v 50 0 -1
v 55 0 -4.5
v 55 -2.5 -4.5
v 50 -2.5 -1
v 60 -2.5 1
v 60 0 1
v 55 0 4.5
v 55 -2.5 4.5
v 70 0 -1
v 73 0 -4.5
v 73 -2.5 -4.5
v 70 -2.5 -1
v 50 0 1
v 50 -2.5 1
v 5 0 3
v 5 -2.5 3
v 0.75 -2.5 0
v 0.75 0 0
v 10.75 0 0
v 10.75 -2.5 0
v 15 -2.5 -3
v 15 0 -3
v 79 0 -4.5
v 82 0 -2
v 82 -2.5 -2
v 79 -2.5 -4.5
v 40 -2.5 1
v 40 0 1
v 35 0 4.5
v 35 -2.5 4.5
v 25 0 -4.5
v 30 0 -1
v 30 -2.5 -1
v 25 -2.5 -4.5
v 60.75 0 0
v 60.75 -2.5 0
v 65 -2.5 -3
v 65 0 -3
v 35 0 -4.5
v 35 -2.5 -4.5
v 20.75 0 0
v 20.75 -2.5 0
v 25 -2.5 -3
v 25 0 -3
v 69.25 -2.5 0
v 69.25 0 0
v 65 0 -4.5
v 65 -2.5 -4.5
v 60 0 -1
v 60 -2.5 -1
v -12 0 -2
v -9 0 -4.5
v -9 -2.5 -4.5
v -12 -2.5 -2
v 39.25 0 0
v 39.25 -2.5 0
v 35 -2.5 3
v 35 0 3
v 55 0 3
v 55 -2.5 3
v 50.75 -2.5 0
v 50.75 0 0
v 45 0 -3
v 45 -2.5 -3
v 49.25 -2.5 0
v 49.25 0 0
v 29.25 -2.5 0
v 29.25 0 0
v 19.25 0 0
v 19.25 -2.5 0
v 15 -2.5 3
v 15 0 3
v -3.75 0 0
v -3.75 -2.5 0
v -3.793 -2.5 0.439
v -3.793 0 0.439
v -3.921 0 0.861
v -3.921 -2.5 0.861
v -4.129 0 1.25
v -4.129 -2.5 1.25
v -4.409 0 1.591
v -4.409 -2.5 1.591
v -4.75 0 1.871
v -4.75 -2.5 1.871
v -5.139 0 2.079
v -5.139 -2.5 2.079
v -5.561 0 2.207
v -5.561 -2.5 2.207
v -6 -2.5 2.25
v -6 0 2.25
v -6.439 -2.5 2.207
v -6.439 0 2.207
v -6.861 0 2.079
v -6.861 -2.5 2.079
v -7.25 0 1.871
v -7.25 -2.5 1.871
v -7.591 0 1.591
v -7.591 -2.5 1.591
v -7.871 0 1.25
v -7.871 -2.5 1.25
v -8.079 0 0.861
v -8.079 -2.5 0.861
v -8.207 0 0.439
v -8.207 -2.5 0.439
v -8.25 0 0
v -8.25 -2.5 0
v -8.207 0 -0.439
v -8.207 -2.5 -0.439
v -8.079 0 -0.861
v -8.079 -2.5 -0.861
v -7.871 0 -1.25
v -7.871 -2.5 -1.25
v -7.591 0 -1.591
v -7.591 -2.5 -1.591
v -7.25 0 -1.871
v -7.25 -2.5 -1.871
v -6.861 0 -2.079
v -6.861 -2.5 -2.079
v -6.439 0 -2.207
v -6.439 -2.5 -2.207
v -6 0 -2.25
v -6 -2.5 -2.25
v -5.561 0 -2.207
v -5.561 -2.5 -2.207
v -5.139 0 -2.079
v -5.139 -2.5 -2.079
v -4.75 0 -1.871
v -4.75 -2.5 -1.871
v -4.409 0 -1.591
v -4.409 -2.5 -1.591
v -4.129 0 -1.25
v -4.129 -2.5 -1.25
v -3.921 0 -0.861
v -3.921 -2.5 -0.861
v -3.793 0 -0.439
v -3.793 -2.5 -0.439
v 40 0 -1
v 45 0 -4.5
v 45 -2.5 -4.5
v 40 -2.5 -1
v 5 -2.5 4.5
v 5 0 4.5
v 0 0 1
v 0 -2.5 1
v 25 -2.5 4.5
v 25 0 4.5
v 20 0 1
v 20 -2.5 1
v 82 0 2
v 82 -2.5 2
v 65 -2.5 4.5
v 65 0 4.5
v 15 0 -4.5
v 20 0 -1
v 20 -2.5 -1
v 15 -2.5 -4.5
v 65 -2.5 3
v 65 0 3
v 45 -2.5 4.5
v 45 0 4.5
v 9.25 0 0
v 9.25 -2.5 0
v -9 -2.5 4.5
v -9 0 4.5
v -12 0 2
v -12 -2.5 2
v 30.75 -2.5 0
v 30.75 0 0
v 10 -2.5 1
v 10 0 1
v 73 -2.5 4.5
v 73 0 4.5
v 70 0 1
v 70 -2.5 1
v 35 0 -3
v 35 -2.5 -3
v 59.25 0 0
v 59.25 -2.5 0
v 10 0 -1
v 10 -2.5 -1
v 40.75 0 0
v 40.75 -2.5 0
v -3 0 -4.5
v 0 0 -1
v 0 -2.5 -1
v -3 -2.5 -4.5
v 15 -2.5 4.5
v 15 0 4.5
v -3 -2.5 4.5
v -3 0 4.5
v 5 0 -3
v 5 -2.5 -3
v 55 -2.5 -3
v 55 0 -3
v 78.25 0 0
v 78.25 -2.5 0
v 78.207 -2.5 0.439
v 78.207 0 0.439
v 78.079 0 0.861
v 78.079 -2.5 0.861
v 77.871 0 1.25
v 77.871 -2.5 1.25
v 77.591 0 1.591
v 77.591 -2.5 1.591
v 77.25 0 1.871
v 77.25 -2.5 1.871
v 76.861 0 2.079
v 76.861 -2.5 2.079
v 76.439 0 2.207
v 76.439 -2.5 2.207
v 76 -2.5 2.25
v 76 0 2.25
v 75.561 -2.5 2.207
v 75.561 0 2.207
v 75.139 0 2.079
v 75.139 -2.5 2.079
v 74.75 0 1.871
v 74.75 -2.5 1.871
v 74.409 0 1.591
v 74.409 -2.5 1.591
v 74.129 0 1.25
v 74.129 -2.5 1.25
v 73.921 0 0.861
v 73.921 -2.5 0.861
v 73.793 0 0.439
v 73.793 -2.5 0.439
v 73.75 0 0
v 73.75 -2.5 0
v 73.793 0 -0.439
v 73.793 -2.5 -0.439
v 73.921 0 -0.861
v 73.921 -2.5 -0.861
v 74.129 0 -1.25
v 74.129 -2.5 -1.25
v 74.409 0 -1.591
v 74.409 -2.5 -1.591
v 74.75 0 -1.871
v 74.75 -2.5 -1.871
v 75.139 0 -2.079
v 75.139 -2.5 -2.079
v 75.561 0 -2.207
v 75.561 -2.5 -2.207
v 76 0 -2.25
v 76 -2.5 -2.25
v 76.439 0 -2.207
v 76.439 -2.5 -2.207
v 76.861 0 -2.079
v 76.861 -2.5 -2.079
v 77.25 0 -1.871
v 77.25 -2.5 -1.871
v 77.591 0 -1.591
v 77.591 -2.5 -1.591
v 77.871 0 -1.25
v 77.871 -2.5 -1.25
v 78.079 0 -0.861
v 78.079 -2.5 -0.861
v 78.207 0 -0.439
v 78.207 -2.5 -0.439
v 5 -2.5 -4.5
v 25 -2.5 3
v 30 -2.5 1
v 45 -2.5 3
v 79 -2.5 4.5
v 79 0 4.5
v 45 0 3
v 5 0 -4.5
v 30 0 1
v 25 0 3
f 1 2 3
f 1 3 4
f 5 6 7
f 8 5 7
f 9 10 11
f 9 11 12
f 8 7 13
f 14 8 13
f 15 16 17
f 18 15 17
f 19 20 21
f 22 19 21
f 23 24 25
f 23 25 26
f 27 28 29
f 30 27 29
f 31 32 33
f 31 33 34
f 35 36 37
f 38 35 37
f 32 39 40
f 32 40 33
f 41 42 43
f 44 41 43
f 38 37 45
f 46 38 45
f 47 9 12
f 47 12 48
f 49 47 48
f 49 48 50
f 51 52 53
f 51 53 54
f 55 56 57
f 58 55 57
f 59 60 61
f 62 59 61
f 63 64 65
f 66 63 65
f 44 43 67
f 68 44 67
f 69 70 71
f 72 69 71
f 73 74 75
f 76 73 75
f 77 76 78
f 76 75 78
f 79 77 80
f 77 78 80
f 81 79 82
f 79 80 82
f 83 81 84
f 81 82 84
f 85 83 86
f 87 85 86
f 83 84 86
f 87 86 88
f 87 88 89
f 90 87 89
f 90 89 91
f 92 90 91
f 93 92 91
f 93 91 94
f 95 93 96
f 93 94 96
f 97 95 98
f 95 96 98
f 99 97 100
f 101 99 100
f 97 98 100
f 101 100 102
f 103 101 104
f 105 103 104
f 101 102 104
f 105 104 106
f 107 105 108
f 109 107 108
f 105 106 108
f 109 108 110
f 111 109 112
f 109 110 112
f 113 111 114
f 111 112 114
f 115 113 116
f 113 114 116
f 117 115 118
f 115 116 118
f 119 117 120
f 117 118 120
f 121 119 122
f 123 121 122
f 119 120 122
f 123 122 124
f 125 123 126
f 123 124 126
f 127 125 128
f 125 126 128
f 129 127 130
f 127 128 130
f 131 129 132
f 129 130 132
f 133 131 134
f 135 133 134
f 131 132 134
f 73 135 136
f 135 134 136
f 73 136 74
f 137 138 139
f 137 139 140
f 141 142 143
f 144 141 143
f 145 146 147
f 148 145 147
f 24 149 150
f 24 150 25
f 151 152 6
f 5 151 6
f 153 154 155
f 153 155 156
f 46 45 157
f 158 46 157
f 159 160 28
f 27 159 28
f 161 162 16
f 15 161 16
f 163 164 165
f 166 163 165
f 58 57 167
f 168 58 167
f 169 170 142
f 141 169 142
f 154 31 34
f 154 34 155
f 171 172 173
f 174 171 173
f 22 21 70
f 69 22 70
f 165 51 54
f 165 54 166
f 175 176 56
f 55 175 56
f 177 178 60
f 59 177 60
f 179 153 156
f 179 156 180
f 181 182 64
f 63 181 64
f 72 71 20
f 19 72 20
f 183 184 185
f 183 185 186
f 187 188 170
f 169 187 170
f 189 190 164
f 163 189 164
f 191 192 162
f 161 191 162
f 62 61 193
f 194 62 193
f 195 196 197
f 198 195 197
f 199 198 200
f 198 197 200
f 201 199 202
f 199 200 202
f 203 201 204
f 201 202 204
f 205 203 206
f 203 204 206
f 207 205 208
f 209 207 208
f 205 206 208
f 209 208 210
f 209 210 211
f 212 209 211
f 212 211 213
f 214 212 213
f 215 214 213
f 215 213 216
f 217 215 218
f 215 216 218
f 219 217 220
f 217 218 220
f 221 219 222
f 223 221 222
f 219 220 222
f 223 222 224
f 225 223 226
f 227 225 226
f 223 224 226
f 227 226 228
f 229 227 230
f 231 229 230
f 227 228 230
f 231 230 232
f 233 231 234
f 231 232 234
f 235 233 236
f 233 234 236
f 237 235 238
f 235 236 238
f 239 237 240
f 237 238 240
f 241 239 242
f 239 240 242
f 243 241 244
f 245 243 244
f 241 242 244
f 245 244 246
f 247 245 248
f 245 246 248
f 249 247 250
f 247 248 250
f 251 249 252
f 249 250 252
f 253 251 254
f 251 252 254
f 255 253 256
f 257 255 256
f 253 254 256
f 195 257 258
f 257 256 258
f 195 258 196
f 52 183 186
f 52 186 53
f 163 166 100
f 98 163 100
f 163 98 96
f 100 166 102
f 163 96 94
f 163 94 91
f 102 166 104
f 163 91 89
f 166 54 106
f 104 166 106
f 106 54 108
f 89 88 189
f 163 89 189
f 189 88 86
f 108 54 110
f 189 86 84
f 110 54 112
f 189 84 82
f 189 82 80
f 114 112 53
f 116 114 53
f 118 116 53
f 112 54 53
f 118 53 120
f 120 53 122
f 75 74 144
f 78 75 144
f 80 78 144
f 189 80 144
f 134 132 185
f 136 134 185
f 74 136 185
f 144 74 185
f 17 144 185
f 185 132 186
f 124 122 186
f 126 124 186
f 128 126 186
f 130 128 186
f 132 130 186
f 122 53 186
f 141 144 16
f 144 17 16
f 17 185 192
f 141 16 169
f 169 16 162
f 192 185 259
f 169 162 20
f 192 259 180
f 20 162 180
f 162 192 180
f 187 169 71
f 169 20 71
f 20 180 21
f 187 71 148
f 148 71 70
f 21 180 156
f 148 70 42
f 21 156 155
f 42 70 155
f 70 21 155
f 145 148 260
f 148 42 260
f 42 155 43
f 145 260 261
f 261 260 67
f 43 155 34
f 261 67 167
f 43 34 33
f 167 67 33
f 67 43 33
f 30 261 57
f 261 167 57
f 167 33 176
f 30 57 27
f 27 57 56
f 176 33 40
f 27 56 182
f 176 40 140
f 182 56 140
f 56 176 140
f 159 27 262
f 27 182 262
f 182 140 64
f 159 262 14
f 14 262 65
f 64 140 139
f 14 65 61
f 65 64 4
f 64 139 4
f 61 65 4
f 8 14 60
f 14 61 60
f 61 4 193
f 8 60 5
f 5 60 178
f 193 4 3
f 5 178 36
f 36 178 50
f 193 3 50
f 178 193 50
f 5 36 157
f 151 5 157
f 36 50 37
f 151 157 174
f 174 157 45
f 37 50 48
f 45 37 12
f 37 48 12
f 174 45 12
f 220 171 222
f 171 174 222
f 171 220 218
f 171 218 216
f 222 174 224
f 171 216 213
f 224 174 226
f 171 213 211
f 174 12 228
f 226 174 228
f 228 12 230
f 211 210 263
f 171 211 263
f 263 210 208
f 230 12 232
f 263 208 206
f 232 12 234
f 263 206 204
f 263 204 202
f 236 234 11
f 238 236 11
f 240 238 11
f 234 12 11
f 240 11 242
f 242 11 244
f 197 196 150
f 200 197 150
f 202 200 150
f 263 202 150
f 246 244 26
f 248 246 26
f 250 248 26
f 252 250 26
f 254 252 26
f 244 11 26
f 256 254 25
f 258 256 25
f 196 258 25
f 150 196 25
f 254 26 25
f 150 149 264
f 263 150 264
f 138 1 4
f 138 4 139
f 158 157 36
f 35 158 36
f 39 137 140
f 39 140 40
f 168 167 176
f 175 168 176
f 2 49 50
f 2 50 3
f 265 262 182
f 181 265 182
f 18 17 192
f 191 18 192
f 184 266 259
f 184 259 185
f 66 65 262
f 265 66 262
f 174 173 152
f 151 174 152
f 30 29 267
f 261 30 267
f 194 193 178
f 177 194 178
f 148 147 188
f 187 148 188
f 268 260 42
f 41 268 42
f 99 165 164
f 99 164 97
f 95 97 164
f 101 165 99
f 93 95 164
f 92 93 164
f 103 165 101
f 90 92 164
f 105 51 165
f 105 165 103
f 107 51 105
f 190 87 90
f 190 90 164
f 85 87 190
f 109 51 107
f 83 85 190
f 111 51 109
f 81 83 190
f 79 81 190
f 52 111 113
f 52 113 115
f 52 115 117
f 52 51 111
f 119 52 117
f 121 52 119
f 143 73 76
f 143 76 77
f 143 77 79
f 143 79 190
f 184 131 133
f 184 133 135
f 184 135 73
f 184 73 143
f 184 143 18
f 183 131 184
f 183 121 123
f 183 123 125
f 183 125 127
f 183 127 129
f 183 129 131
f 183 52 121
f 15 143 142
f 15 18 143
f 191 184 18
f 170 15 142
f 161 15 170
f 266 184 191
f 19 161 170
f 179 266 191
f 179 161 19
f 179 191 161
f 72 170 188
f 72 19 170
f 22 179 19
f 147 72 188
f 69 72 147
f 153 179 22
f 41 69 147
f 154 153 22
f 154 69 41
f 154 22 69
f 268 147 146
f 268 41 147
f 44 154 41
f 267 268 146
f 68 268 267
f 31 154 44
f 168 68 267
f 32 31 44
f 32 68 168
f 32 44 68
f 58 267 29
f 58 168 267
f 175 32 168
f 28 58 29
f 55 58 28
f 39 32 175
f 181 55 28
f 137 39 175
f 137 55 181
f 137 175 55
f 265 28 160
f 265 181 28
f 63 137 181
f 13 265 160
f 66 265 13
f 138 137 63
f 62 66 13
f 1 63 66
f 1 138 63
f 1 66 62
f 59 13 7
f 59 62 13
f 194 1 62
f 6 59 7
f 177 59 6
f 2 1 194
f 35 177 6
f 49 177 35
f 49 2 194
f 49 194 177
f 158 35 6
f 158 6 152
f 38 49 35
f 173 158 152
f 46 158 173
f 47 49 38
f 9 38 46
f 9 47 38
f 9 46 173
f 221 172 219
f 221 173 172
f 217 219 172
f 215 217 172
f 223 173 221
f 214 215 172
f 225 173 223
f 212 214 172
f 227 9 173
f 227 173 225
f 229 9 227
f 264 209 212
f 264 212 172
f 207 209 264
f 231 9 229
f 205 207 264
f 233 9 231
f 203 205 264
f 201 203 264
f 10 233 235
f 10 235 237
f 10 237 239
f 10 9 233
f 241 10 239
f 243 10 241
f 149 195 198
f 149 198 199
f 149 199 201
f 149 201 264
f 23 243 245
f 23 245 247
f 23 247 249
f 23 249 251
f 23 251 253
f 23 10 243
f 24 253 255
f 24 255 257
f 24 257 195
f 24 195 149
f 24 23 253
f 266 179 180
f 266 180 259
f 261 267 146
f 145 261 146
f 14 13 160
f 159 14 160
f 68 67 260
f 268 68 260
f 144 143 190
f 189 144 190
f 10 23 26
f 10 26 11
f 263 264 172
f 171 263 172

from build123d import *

# Parameters (mm, degrees)
F1_DEPTH = 2.5
F4_DEPTH = 2.5
F5_R     = 2.25
F6_DEPTH = 2.5


with BuildPart() as f1:
    # F0 (on Front) → F1 (new body)
    with BuildSketch(Plane.XZ):
        Polygon((0, 0), (70, 0), (82, 0), (82, 2), (79, 4.5), (73, 4.5), (70, 1), (65, 4.5), (60, 1), (55, 4.5), (50, 1), (45, 4.5), (40, 1), (35, 4.5), (30, 1), (25, 4.5), (20, 1), (15, 4.5), (10, 1), (5, 4.5), (0, 1), (-3, 4.5), (-9, 4.5), (-12, 2), (-12, 0), align=None)
    extrude(amount=F1_DEPTH)

    # F2: F1 across plane


with BuildPart() as f1_1:
    add(f1.part)
    add(f1.part.mirror(Plane.XY))

    # F3 (on face) → F4 (cut, through all)
    with BuildSketch(Plane.XZ.offset(2.5)):
        Polygon((5, 3), (0.75, 0), (5, -3), (9.25, 0), align=None)
        Polygon((25, 3), (20.75, 0), (25, -3), (29.25, 0), align=None)
        Polygon((35, 3), (30.75, 0), (35, -3), (39.25, 0), align=None)
        Polygon((45, 3), (40.75, 0), (45, -3), (49.25, 0), align=None)
        Polygon((55, 3), (50.75, 0), (55, -3), (59.25, 0), align=None)
        Polygon((65, 3), (60.75, 0), (65, -3), (69.25, 0), align=None)
        Polygon((15, 3), (10.75, 0), (15, -3), (19.25, 0), align=None)
    extrude(amount=-F4_DEPTH, mode=Mode.SUBTRACT)

    # F5 (on face) → F6 (cut, through all)
    with BuildSketch(Plane.XZ.offset(2.5)):
        with Locations((-6, 0)):
            Circle(F5_R)
        with Locations((76, 0)):
            Circle(F5_R)
    extrude(amount=-F6_DEPTH, mode=Mode.SUBTRACT)


solid = f1_1.part
